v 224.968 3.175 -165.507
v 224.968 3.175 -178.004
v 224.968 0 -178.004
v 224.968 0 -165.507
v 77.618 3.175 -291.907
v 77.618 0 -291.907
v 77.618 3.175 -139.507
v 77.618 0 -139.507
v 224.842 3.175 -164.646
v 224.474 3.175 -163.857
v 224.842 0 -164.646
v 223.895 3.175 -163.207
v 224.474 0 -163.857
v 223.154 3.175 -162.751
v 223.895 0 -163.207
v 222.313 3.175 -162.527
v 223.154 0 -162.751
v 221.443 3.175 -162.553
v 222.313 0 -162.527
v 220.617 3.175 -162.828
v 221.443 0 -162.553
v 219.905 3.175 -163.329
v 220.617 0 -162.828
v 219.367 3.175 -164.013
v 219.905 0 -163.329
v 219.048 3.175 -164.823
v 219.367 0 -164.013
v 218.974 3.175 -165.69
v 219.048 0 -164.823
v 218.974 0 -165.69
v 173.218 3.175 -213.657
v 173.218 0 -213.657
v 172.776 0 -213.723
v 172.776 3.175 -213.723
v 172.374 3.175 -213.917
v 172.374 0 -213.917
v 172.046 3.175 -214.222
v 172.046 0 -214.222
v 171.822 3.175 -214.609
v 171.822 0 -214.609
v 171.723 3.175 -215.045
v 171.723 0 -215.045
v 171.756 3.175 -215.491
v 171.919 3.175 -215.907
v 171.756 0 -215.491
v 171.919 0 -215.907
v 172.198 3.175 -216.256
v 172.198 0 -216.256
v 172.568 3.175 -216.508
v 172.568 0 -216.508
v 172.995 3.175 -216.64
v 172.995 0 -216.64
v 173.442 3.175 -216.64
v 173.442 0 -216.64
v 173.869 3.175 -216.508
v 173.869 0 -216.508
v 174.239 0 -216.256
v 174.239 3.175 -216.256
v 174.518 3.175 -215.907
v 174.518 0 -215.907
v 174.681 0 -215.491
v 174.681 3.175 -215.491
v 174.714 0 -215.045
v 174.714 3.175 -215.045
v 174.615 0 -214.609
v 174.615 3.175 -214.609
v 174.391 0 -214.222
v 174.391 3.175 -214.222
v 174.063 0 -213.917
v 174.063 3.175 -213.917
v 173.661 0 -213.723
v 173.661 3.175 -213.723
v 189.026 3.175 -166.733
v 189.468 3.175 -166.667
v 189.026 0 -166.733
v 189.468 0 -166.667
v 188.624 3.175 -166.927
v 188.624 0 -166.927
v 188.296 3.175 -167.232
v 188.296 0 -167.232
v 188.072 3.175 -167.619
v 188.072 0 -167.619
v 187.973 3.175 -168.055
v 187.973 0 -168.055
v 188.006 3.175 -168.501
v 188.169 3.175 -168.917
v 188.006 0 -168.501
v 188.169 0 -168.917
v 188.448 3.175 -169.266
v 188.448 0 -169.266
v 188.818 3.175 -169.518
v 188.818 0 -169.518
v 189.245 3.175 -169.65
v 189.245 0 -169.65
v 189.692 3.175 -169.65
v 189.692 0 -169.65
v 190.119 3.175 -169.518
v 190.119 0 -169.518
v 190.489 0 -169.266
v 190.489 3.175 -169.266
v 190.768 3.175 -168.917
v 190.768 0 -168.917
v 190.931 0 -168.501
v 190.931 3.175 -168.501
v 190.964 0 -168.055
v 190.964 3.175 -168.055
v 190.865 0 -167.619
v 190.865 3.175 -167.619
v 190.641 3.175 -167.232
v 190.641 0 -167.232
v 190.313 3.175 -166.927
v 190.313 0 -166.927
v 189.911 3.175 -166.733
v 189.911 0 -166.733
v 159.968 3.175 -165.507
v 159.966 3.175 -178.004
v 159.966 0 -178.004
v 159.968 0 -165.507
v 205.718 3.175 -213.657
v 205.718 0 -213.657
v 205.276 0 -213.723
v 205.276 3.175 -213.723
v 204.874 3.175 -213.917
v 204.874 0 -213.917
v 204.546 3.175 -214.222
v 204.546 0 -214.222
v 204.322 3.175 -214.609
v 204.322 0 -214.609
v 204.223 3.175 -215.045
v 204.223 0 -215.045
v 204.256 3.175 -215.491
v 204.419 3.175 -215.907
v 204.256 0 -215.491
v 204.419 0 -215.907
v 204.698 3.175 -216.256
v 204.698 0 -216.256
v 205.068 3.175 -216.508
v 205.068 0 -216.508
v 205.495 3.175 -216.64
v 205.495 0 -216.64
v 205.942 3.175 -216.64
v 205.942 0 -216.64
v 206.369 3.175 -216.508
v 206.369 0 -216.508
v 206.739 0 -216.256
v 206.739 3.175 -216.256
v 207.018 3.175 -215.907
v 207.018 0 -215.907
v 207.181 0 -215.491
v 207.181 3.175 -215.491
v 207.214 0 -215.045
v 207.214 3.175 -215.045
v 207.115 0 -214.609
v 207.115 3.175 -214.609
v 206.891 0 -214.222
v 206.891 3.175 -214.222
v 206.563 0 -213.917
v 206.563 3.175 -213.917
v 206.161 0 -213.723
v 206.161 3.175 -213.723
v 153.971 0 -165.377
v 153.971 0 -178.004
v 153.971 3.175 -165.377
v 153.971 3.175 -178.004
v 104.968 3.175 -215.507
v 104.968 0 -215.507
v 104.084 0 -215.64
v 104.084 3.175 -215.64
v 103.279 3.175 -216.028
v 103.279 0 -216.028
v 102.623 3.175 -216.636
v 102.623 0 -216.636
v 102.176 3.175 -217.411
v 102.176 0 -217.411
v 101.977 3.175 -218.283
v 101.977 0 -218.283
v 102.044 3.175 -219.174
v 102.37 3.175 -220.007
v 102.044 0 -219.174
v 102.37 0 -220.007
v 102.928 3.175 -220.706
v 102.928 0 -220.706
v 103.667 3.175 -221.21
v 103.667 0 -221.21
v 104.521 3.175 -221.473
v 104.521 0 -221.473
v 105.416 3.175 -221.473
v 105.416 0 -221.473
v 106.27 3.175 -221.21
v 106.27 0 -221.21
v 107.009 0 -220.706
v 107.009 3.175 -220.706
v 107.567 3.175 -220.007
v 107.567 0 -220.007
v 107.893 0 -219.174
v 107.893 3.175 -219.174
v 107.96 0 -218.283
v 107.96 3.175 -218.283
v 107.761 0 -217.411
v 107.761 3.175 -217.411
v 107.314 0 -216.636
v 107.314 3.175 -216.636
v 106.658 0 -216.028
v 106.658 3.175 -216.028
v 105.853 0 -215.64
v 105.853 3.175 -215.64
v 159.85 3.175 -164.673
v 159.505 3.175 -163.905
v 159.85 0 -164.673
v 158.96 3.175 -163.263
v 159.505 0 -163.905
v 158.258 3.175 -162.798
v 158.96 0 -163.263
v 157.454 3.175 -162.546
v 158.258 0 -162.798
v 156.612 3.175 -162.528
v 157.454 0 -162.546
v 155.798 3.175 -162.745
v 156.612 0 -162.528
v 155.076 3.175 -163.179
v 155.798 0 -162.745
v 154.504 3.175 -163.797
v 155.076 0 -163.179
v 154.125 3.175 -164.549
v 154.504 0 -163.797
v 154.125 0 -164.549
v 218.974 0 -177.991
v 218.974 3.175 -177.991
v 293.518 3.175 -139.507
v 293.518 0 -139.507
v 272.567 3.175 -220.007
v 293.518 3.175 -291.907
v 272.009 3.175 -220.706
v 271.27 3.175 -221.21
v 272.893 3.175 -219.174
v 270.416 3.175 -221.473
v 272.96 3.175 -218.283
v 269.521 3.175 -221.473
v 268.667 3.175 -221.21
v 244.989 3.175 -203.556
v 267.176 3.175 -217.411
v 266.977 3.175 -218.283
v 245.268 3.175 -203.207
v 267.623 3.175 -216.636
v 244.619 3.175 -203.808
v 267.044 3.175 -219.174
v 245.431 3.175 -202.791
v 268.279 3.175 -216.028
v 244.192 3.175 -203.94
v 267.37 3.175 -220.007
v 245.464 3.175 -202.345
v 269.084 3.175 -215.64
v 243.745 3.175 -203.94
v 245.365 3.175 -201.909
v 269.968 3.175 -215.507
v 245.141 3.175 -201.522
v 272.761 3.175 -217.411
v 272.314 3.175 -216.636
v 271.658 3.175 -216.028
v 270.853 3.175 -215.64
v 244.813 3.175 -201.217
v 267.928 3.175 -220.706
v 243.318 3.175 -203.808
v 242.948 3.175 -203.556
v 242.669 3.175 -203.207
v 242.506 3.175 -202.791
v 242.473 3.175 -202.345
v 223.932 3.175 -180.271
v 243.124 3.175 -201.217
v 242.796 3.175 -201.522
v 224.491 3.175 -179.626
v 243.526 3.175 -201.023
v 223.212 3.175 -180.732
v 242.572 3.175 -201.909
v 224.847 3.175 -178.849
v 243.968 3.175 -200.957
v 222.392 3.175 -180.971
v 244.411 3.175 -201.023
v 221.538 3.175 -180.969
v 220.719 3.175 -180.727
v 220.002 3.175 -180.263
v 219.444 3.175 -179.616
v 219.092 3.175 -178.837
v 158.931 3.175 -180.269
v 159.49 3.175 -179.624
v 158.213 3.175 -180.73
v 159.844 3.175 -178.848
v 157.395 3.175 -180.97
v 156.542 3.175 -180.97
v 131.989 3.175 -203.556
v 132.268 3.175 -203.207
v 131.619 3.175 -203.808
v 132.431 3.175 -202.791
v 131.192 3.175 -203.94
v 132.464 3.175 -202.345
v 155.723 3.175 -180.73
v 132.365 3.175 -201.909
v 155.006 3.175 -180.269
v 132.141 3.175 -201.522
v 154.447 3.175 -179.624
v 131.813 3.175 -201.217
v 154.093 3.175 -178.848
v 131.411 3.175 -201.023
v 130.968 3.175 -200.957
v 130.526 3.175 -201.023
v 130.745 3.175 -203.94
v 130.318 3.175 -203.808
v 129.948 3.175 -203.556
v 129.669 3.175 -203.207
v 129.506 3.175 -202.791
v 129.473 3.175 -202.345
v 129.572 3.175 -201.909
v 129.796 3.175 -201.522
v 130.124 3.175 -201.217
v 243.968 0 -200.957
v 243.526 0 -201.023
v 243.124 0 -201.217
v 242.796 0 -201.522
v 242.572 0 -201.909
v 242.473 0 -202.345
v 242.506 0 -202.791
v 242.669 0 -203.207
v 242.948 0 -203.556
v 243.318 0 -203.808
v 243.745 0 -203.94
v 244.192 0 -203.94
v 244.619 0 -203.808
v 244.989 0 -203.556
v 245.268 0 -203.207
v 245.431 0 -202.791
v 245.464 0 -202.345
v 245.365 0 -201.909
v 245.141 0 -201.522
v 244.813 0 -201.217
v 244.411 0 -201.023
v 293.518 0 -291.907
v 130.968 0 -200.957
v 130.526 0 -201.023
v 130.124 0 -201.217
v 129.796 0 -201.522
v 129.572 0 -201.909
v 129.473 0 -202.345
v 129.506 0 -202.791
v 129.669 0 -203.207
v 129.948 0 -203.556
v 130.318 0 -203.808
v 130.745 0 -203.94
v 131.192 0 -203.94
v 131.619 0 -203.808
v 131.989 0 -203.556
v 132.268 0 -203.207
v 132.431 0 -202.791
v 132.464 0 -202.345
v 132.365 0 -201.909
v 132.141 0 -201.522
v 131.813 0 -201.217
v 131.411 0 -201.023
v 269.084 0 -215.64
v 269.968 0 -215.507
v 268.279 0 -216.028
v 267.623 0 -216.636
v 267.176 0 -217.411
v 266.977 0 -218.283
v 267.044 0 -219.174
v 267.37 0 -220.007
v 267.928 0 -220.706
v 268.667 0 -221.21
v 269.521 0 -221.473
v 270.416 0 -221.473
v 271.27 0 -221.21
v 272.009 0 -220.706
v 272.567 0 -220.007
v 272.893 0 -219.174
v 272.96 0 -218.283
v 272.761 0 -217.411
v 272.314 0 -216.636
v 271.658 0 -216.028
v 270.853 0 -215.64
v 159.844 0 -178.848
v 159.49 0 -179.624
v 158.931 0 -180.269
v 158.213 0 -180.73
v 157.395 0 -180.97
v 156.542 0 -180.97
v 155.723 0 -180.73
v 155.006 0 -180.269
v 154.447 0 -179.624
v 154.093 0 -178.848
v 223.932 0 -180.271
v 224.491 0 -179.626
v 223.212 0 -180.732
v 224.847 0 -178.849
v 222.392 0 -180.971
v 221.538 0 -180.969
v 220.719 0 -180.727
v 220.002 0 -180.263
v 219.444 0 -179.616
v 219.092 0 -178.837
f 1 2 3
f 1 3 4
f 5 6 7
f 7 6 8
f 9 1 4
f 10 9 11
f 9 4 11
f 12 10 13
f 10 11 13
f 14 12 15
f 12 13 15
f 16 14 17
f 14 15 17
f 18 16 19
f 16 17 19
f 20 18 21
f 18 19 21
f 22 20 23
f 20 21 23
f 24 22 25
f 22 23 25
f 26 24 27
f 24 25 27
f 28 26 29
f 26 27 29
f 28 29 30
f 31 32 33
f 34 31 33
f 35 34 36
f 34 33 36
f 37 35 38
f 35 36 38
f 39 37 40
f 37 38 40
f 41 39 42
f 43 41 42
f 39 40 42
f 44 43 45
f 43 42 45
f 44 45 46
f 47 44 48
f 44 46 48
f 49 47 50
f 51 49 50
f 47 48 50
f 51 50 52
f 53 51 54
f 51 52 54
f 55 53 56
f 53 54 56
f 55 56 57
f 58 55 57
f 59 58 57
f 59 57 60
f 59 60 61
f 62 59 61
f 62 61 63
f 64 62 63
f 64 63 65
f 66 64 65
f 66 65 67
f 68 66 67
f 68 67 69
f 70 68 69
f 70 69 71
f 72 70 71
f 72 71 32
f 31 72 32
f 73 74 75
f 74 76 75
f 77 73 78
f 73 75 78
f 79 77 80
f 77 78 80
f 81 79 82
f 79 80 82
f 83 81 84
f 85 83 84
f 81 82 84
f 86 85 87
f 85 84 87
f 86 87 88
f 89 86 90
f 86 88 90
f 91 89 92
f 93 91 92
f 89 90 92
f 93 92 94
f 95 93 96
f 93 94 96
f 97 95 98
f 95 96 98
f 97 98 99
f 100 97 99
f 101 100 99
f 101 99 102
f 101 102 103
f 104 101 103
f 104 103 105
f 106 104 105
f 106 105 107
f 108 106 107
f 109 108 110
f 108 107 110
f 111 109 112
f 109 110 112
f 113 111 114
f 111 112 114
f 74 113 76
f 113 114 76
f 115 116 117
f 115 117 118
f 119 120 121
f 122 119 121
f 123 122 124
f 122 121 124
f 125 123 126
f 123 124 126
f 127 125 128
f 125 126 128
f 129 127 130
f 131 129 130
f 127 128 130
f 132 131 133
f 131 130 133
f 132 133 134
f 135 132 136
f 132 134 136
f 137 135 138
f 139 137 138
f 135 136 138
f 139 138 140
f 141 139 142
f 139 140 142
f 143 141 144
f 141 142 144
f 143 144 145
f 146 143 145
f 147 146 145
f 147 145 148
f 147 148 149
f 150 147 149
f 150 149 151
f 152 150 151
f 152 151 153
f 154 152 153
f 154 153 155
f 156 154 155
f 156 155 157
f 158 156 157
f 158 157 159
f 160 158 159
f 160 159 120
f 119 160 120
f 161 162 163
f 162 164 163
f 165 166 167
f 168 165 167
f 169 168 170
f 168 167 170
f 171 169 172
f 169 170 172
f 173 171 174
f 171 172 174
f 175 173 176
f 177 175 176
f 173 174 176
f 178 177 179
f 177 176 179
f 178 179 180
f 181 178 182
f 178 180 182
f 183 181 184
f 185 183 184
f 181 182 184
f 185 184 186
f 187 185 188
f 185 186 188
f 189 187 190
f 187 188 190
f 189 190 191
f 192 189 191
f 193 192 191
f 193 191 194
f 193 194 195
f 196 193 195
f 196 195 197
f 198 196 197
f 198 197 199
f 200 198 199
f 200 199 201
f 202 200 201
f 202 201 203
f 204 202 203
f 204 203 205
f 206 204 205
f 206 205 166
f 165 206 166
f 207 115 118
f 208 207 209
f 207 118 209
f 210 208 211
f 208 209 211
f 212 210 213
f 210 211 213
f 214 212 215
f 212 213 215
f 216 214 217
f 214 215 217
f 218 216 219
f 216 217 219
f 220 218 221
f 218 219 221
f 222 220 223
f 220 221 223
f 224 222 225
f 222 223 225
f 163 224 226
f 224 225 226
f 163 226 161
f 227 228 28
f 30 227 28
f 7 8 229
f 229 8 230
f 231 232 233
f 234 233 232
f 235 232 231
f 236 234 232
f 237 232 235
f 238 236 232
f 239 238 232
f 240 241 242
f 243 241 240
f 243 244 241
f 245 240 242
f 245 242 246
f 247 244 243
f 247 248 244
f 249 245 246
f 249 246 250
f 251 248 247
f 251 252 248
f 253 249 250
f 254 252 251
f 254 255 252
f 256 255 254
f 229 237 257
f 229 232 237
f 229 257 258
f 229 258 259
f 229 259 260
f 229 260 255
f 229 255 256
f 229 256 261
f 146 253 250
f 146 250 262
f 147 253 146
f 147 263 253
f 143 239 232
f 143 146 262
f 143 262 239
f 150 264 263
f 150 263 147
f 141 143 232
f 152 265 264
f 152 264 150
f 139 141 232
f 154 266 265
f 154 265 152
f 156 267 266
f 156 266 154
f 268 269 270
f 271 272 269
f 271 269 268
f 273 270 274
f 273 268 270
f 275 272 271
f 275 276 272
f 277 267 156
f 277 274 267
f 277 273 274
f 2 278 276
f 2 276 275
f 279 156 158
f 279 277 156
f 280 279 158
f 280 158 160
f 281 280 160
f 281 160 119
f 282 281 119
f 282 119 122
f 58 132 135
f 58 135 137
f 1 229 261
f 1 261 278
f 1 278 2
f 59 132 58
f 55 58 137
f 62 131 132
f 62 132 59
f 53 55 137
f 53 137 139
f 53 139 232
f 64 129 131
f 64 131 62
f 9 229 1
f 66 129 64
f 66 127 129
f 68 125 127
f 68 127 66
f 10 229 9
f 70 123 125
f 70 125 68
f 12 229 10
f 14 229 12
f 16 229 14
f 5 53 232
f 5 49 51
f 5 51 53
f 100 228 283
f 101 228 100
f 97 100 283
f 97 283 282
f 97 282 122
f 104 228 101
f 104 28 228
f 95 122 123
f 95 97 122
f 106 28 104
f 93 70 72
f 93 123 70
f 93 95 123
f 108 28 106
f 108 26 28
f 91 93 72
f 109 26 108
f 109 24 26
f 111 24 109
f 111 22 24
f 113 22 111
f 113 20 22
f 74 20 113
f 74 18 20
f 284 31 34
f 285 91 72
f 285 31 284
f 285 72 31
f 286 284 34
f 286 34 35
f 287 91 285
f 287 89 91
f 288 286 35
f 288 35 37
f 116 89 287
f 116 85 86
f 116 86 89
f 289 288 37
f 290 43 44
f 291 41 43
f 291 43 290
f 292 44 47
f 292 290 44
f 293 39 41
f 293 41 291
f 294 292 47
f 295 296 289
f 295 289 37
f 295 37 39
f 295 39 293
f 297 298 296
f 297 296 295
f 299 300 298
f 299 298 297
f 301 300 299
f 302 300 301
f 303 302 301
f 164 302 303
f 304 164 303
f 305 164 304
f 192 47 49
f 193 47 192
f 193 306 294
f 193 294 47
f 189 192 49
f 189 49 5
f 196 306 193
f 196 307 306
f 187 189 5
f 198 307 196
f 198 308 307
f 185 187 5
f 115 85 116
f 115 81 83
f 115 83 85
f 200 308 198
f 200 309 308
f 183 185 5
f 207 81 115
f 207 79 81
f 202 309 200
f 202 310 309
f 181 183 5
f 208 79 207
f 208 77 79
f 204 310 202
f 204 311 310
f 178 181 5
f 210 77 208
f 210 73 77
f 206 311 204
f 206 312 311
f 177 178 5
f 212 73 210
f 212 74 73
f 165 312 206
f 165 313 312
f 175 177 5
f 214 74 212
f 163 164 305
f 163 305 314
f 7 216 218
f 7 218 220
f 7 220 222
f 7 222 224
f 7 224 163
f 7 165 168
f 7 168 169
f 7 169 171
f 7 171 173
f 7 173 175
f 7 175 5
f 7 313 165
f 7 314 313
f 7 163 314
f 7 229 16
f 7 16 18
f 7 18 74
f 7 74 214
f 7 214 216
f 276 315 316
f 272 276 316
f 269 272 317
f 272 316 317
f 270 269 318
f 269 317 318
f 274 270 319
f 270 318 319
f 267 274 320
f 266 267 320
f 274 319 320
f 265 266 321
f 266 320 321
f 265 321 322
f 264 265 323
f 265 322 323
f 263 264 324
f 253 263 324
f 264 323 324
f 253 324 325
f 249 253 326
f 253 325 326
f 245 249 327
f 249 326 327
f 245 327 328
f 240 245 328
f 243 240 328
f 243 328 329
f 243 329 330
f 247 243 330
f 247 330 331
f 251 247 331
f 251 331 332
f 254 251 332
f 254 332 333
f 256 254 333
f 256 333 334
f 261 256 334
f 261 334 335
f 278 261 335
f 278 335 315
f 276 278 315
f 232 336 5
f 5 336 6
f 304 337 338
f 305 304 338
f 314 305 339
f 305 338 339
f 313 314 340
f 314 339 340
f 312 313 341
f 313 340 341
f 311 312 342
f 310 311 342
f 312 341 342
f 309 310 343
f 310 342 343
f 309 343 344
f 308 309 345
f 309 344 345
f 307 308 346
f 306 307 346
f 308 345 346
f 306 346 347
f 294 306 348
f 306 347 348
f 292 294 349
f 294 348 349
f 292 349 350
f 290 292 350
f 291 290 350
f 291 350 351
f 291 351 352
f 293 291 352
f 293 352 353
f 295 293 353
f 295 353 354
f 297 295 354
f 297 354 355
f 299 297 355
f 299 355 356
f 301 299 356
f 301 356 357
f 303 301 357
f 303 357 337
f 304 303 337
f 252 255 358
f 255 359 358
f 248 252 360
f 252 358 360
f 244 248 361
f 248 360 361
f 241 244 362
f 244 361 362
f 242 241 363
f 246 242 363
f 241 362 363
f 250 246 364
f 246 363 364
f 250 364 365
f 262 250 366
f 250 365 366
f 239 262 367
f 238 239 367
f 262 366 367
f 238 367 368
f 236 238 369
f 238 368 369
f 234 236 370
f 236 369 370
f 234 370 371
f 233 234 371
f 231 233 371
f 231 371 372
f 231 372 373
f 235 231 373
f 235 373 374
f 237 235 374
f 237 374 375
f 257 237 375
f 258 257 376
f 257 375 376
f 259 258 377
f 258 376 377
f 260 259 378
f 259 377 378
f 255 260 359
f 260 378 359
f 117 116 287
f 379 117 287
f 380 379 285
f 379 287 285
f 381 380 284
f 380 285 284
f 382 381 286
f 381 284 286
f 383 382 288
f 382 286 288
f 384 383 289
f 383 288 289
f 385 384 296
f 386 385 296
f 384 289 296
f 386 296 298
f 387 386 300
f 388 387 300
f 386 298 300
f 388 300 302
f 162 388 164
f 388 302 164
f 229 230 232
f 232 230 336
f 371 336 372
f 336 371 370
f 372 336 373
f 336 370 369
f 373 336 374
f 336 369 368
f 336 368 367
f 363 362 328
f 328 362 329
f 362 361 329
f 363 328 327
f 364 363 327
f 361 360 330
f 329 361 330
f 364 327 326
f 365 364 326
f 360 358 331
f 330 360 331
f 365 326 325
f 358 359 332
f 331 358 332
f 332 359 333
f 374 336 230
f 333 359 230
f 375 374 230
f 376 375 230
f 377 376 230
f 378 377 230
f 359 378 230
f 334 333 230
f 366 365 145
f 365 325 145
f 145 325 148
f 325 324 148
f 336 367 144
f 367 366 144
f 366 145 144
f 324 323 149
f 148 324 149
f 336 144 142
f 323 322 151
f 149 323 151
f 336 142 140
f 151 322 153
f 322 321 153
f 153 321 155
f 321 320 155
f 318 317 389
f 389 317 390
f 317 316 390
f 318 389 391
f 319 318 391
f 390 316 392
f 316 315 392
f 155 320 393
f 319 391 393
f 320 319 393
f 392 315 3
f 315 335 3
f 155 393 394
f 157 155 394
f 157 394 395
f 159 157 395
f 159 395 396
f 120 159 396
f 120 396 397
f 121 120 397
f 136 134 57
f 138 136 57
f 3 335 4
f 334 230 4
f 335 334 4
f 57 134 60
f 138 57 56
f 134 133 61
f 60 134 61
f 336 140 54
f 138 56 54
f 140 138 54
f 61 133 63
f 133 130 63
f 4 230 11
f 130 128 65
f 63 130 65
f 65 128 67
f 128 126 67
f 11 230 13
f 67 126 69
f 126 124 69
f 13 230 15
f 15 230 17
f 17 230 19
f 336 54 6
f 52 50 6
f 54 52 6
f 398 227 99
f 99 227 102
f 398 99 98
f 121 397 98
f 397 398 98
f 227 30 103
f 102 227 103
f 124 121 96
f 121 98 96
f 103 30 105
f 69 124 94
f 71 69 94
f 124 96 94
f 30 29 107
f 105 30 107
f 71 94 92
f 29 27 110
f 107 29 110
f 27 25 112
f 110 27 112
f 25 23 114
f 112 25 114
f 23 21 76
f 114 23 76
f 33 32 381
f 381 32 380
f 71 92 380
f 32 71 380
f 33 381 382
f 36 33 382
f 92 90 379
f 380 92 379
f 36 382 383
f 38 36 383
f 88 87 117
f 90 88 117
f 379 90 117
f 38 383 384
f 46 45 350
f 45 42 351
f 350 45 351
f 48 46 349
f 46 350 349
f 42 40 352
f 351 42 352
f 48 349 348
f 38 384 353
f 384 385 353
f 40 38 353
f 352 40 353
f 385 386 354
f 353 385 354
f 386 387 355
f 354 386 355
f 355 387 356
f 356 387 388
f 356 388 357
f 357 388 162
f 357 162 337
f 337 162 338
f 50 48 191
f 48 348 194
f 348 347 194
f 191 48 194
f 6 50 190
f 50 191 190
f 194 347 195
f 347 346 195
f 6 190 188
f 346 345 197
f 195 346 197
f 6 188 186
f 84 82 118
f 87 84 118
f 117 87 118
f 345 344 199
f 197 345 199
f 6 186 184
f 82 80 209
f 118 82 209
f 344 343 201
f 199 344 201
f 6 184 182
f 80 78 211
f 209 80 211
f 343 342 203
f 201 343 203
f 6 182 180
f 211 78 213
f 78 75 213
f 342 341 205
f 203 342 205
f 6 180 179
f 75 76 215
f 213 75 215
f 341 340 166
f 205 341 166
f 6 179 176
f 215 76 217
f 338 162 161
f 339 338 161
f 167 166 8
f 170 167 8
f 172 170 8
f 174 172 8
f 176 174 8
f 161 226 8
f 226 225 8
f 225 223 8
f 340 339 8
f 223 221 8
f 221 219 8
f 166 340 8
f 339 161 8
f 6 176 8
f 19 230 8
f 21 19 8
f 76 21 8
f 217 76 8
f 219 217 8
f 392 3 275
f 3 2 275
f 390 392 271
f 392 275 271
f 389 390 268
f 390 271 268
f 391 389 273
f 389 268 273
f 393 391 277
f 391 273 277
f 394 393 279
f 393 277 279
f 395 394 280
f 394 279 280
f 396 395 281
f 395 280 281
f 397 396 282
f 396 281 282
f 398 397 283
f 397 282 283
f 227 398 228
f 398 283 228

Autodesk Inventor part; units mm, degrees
ref_plane "YZ Plane" through (0, 0, 0) normal (1, 0, 0) x (0, 1, 0)
ref_plane "XZ Plane" through (0, 0, 0) normal (0, 1, 0) x (-1, 0, 0)
ref_plane "XY Plane" through (0, 0, 0) normal (0, 0, 1) x (1, 0, 0)
sketch "Sketch1" plane through (0, 0, 0) normal (0, 1, 0) x (-1, 0, 0)
  line L0 (-77.6185, -139.5068) -> (-293.5185, -139.5068)
  line L1 (-293.5185, -139.5068) -> (-293.5185, -291.9068)
  line L2 (-293.5185, -291.9068) -> (-77.6185, -291.9068)
  line L3 (-77.6185, -291.9068) -> (-77.6185, -139.5068)
  point P0 (0, 0)
  dimension "d0" = 215.9
  dimension "d1" = 152.4
extrude "Extrusion1" add sketch "Sketch1" along normal blind 3.175
sketch "Sketch2" plane through (0, 3.175, 0) normal (0, 1, 0) x (1, 0, 0)
  line L0 (77.6185, 291.9068) -> (77.6185, 139.5068) projected
  line L1 (77.6185, 139.5068) -> (293.5185, 139.5068) projected
  line L2 (293.5185, 139.5068) -> (293.5185, 291.9068) projected
  line L3 (293.5185, 291.9068) -> (77.6185, 291.9068) projected
  point P0 (0, 0)
  point P1 (156.9685, 165.5068)
  point P2 (104.9685, 218.5068)
  point P3 (269.9685, 218.5068)
  point P4 (221.9685, 165.5068)
  dimension "d4" = 144.35
  dimension "d5" = 26
  dimension "d7" = 79
  dimension "d19" = 27.35
  dimension "d20" = 79
  dimension "d21" = 26
  dimension "d22" = 79.35
  dimension "d23" = 192.35
hole "Hole1" at (156.9685, 3.175, -165.5068) at (104.9685, 3.175, -218.5068) at (269.9685, 3.175, -218.5068) at (221.9685, 3.175, -165.5068) direction (0, -1, 0) diameter 6 end through all
sketch "Sketch3" plane through (0, 3.175, 0) normal (0, 1, 0) x (1, 0, 0)
  line L0 (156.9685, 158.0068) -> (221.9685, 158.0068)
  circle A0 centre (221.9685, 165.5068) radius 3 projected
  circle A1 centre (104.3905, 218.5068) radius 3
  circle A2 centre (156.9685, 165.5068) radius 3 projected
  line L1 (151.4095, 160.4723) -> (145.8978, 166.5581)
  line L2 (227.8466, 160.8487) -> (232.9461, 167.2839)
  line L3 (77.6185, 139.5068) -> (293.5185, 139.5068)
  line L4 (293.5185, 139.5068) -> (293.5185, 291.9068)
  line L5 (293.5185, 291.9068) -> (77.6185, 291.9068)
  line L6 (77.6185, 291.9068) -> (77.6185, 139.5068)
  arc A3 (151.4095, 160.4723) -> (156.9685, 158.0068) centre (156.9685, 165.5068) ccw
  arc A4 (285.8541, 234.0487) -> (286.0149, 234.2591) centre (279.976, 238.7068) ccw
  line L7 (48.2791, 233.5068) -> (391.5458, 233.5068) construction
  arc A5 (221.9685, 158.0068) -> (227.8466, 160.8487) centre (221.9685, 165.5068) ccw
  line L8 (90.6742, 246.2068) -> (279.976, 246.2068)
  arc A6 (88.4435, 245.8674) -> (89.1827, 246.2068) centre (87.4992, 248.8988) ccw
  arc A7 (282.3943, 247.7992) -> (282.8225, 246.2068) centre (285.5693, 247.7992) ccw
  arc A8 (148.7259, 158.0419) -> (156.9685, 154.3863) centre (156.9685, 165.5068) ccw
  line L9 (156.9685, 154.3863) -> (221.9685, 154.3863)
  arc A9 (221.9685, 154.3863) -> (230.6842, 158.6001) centre (221.9685, 165.5068) ccw
  arc A10 (291.0908, 238.7068) -> (290.9416, 240.5219) centre (279.976, 238.7068) ccw
  line L10 (274.8873, 282.434) -> (98.1672, 282.434)
  line L11 (283.4416, 282.434) -> (274.8873, 282.434)
  line L12 (87.0466, 282.434) -> (98.1672, 282.434)
  circle A11 centre (269.9685, 218.5068) radius 3 projected
  line L13 (269.9685, 218.5068) -> (278.4956, 210.4264)
  line L14 (230.6842, 158.6001) -> (278.4956, 210.4264)
  line L15 (276.6668, 208.4441) -> (288.7468, 219.8795)
  line L16 (293.5185, 139.5068) -> (293.5185, 291.9068) projected
  line L17 (291.0908, 238.7068) -> (291.0908, 225.3261)
  line L18 (290.9416, 240.5219) -> (290.9416, 274.941)
  arc A12 (290.9416, 274.941) -> (283.4416, 282.434) centre (283.4486, 274.941) ccw
  line L19 (104.3905, 218.5068) -> (95.8634, 210.4264)
  line L20 (148.7259, 158.0419) -> (95.8634, 210.4264)
  line L21 (97.2189, 209.0832) -> (81.9058, 223.5361)
  line L22 (77.6185, 291.9068) -> (77.6185, 139.5068) projected
  line L23 (79.5536, 238.7068) -> (79.5536, 228.9904)
  line L24 (79.5536, 238.7068) -> (79.5536, 274.941)
  line L25 (87.0466, 282.434) -> (87.0466, 282.434)
  arc A13 (87.0466, 282.434) -> (79.5536, 274.941) centre (87.0466, 274.941) ccw
  arc A14 (288.7468, 219.8795) -> (291.0908, 225.3261) centre (283.5908, 225.3261) ccw
  arc A15 (79.5536, 228.9904) -> (81.9058, 223.5361) centre (87.0536, 228.9904) ccw
  line L26 (90.5024, 222.3303) -> (90.6742, 222.1407)
  arc A16 (79.6034, 239.7581) -> (79.5536, 238.7068) centre (90.6742, 238.7068) ccw
  line L27 (90.6742, 246.2068) -> (98.8849, 246.2068)
  line L28 (240.7374, 246.2068) -> (279.976, 246.2068)
  line L29 (271.4881, 215.9202) -> (272.0071, 216.5751)
  line L30 (285.4247, 233.5068) -> (285.8541, 234.0487)
  line L31 (85.2649, 233.5068) -> (85.1151, 233.6723)
  circle A17 centre (104.9685, 218.5068) radius 3 construction
  point P0 (0, 0)
  point P1 (79.5536, 282.434)
  dimension "d24" = 7.5
  dimension "d33" = 7.5
  dimension "d40" = 98.7582
  dimension "d72" = 6
  dimension "d90" = 3.175
  dimension "d91" = 3.175
  dimension "d93" = 7.5
  dimension "d96" = 52.578
  dimension "d98" = 11.7475
  dimension "d99" = 7.493
  dimension "d101" = 11.7475
  dimension "d102" = 7.493
  dimension "d103" = 7.5
  dimension "d104" = 7.5
  dimension "d106" = 6
extrude "Extrusion3" [suppressed]
sketch "Sketch5" plane through (0, 3.175, 0) normal (0, 1, 0) x (1, 0, 0)
  circle A0 centre (104.9685, 218.5068) radius 3 projected
  circle A1 centre (104.9685, 218.5068) radius 22.225
  circle A2 centre (156.9685, 165.5068) radius 3 projected
  circle A3 centre (156.9685, 165.5068) radius 22.225
  circle A4 centre (221.9685, 165.5068) radius 3 projected
  circle A5 centre (221.9685, 165.5068) radius 22.225
  circle A6 centre (269.9685, 218.5068) radius 3 projected
  circle A7 centre (269.9685, 218.5068) radius 22.225
  line L0 (156.9685, 158.0068) -> (221.9685, 158.0068) projected
  line L1 (274.8943, 278.8204) -> (98.1742, 278.8204) projected
  point P0 (0, 0)
  point P1 (130.9685, 202.4568)
  point P2 (243.9685, 202.4568)
  point P3 (205.7185, 215.1568)
  point P4 (189.4685, 168.1668)
  point P5 (173.2185, 215.1568)
  dimension "d45" = 44.45
  dimension "d47" = 44.45
  dimension "d48" = 44.45
  dimension "d49" = 44.45
  dimension "d50" = 57.15
  dimension "d52" = 65
  dimension "d53" = 16.25
  dimension "d54" = 16.25
  dimension "d55" = 57.15
  dimension "d56" = 44.45
  dimension "d58" = 52
  dimension "d59" = 26
  dimension "d60" = 44.45
  dimension "d61" = 26
  dimension "d62" = 32.5
  dimension "d63" = 10.16
  dimension "d95" = 60.3136
hole "Hole2" at (130.9685, 3.175, -202.4568) at (243.9685, 3.175, -202.4568) at (205.7185, 3.175, -215.1568) at (189.4685, 3.175, -168.1668) at (173.2185, 3.175, -215.1568) direction (0, -1, 0) diameter 3 end through all
sketch "Sketch7" plane through (0, 3.175, 0) normal (0, 1, 0) x (1, 0, 0)
  circle A0 centre (156.9685, 165.5068) radius 3 projected
  line L0 (156.9685, 158.0068) -> (221.9685, 158.0068) projected
  circle A1 centre (156.9685, 178.0036) radius 2.9972
  line L1 (153.9713, 178.0036) -> (153.9713, 165.3773)
  line L2 (159.9657, 178.0043) -> (159.9685, 165.5075)
  circle A2 centre (221.9713, 178.0036) radius 2.9972
  circle A3 centre (221.9685, 165.5068) radius 3 projected
  line L3 (218.9741, 178.016) -> (218.9741, 165.3232)
  line L4 (224.9685, 178.0036) -> (224.9685, 165.5068)
  point P0 (0, 0)
  point P1 (218.9685, 165.5082)
  dimension "d76" = 5.9944
  dimension "d77" = 12.4968
  dimension "d78" = 5.9944
  dimension "d79" = 12.4968
  dimension "d88" = 6
extrude "Extrusion4" cut sketch "Sketch7" against normal blind 25.4 contours A0 L1 A1 L2 | A1
sketch "Sketch8" plane through (0, 3.175, 0) normal (0, 1, 0) x (1, 0, 0)
  arc A0 (224.9685, 178.0036) -> (218.9741, 177.9913) centre (221.9713, 178.0036) ccw
  circle A1 centre (221.9685, 165.5068) radius 3
  line L0 (218.9741, 178.016) -> (218.9741, 165.3232)
  line L1 (224.9685, 178.0036) -> (224.9685, 165.5068)
  point P0 (0, 0)
  point P1 (218.9685, 165.5082)
  dimension "d82" = 5.9944
  dimension "d83" = 12.4968
extrude "Extrusion5" cut sketch "Sketch8" against normal blind 25.4 contours L1 A1 L0 A0 | A1 L0 picked at (221.9464, 164.5591)
sketch "Sketch9" plane through (0, 3.175, 0) normal (0, 1, 0) x (1, 0, 0)
  point P0 (0, 0)
equation "\"d33\" = d32"
equation "\"d101\" = d98"
equation "\"d47\" = d45"
equation "\"d48\" = d45"
equation "\"d49\" = d48"
equation "\"d53\" = 0.25 * d52"
equation "\"d54\" = d53"
equation "\"d55\" = d50"
equation "\"d59\" = 0.5 * d58"
equation "\"d60\" = d56"
equation "\"d61\" = d59"
equation "\"d62\" = 0.5 * d52"
equation "\"d78\" = d76"
equation "\"d79\" = d77"
equation "\"d82\" = d84"
equation "\"d83\" = d85"
equation "\"d32\" = 7.5"
equation "\"d84\" = 5.9944"
equation "\"d85\" = 12.4968"
properties part number "track side panel V2"
